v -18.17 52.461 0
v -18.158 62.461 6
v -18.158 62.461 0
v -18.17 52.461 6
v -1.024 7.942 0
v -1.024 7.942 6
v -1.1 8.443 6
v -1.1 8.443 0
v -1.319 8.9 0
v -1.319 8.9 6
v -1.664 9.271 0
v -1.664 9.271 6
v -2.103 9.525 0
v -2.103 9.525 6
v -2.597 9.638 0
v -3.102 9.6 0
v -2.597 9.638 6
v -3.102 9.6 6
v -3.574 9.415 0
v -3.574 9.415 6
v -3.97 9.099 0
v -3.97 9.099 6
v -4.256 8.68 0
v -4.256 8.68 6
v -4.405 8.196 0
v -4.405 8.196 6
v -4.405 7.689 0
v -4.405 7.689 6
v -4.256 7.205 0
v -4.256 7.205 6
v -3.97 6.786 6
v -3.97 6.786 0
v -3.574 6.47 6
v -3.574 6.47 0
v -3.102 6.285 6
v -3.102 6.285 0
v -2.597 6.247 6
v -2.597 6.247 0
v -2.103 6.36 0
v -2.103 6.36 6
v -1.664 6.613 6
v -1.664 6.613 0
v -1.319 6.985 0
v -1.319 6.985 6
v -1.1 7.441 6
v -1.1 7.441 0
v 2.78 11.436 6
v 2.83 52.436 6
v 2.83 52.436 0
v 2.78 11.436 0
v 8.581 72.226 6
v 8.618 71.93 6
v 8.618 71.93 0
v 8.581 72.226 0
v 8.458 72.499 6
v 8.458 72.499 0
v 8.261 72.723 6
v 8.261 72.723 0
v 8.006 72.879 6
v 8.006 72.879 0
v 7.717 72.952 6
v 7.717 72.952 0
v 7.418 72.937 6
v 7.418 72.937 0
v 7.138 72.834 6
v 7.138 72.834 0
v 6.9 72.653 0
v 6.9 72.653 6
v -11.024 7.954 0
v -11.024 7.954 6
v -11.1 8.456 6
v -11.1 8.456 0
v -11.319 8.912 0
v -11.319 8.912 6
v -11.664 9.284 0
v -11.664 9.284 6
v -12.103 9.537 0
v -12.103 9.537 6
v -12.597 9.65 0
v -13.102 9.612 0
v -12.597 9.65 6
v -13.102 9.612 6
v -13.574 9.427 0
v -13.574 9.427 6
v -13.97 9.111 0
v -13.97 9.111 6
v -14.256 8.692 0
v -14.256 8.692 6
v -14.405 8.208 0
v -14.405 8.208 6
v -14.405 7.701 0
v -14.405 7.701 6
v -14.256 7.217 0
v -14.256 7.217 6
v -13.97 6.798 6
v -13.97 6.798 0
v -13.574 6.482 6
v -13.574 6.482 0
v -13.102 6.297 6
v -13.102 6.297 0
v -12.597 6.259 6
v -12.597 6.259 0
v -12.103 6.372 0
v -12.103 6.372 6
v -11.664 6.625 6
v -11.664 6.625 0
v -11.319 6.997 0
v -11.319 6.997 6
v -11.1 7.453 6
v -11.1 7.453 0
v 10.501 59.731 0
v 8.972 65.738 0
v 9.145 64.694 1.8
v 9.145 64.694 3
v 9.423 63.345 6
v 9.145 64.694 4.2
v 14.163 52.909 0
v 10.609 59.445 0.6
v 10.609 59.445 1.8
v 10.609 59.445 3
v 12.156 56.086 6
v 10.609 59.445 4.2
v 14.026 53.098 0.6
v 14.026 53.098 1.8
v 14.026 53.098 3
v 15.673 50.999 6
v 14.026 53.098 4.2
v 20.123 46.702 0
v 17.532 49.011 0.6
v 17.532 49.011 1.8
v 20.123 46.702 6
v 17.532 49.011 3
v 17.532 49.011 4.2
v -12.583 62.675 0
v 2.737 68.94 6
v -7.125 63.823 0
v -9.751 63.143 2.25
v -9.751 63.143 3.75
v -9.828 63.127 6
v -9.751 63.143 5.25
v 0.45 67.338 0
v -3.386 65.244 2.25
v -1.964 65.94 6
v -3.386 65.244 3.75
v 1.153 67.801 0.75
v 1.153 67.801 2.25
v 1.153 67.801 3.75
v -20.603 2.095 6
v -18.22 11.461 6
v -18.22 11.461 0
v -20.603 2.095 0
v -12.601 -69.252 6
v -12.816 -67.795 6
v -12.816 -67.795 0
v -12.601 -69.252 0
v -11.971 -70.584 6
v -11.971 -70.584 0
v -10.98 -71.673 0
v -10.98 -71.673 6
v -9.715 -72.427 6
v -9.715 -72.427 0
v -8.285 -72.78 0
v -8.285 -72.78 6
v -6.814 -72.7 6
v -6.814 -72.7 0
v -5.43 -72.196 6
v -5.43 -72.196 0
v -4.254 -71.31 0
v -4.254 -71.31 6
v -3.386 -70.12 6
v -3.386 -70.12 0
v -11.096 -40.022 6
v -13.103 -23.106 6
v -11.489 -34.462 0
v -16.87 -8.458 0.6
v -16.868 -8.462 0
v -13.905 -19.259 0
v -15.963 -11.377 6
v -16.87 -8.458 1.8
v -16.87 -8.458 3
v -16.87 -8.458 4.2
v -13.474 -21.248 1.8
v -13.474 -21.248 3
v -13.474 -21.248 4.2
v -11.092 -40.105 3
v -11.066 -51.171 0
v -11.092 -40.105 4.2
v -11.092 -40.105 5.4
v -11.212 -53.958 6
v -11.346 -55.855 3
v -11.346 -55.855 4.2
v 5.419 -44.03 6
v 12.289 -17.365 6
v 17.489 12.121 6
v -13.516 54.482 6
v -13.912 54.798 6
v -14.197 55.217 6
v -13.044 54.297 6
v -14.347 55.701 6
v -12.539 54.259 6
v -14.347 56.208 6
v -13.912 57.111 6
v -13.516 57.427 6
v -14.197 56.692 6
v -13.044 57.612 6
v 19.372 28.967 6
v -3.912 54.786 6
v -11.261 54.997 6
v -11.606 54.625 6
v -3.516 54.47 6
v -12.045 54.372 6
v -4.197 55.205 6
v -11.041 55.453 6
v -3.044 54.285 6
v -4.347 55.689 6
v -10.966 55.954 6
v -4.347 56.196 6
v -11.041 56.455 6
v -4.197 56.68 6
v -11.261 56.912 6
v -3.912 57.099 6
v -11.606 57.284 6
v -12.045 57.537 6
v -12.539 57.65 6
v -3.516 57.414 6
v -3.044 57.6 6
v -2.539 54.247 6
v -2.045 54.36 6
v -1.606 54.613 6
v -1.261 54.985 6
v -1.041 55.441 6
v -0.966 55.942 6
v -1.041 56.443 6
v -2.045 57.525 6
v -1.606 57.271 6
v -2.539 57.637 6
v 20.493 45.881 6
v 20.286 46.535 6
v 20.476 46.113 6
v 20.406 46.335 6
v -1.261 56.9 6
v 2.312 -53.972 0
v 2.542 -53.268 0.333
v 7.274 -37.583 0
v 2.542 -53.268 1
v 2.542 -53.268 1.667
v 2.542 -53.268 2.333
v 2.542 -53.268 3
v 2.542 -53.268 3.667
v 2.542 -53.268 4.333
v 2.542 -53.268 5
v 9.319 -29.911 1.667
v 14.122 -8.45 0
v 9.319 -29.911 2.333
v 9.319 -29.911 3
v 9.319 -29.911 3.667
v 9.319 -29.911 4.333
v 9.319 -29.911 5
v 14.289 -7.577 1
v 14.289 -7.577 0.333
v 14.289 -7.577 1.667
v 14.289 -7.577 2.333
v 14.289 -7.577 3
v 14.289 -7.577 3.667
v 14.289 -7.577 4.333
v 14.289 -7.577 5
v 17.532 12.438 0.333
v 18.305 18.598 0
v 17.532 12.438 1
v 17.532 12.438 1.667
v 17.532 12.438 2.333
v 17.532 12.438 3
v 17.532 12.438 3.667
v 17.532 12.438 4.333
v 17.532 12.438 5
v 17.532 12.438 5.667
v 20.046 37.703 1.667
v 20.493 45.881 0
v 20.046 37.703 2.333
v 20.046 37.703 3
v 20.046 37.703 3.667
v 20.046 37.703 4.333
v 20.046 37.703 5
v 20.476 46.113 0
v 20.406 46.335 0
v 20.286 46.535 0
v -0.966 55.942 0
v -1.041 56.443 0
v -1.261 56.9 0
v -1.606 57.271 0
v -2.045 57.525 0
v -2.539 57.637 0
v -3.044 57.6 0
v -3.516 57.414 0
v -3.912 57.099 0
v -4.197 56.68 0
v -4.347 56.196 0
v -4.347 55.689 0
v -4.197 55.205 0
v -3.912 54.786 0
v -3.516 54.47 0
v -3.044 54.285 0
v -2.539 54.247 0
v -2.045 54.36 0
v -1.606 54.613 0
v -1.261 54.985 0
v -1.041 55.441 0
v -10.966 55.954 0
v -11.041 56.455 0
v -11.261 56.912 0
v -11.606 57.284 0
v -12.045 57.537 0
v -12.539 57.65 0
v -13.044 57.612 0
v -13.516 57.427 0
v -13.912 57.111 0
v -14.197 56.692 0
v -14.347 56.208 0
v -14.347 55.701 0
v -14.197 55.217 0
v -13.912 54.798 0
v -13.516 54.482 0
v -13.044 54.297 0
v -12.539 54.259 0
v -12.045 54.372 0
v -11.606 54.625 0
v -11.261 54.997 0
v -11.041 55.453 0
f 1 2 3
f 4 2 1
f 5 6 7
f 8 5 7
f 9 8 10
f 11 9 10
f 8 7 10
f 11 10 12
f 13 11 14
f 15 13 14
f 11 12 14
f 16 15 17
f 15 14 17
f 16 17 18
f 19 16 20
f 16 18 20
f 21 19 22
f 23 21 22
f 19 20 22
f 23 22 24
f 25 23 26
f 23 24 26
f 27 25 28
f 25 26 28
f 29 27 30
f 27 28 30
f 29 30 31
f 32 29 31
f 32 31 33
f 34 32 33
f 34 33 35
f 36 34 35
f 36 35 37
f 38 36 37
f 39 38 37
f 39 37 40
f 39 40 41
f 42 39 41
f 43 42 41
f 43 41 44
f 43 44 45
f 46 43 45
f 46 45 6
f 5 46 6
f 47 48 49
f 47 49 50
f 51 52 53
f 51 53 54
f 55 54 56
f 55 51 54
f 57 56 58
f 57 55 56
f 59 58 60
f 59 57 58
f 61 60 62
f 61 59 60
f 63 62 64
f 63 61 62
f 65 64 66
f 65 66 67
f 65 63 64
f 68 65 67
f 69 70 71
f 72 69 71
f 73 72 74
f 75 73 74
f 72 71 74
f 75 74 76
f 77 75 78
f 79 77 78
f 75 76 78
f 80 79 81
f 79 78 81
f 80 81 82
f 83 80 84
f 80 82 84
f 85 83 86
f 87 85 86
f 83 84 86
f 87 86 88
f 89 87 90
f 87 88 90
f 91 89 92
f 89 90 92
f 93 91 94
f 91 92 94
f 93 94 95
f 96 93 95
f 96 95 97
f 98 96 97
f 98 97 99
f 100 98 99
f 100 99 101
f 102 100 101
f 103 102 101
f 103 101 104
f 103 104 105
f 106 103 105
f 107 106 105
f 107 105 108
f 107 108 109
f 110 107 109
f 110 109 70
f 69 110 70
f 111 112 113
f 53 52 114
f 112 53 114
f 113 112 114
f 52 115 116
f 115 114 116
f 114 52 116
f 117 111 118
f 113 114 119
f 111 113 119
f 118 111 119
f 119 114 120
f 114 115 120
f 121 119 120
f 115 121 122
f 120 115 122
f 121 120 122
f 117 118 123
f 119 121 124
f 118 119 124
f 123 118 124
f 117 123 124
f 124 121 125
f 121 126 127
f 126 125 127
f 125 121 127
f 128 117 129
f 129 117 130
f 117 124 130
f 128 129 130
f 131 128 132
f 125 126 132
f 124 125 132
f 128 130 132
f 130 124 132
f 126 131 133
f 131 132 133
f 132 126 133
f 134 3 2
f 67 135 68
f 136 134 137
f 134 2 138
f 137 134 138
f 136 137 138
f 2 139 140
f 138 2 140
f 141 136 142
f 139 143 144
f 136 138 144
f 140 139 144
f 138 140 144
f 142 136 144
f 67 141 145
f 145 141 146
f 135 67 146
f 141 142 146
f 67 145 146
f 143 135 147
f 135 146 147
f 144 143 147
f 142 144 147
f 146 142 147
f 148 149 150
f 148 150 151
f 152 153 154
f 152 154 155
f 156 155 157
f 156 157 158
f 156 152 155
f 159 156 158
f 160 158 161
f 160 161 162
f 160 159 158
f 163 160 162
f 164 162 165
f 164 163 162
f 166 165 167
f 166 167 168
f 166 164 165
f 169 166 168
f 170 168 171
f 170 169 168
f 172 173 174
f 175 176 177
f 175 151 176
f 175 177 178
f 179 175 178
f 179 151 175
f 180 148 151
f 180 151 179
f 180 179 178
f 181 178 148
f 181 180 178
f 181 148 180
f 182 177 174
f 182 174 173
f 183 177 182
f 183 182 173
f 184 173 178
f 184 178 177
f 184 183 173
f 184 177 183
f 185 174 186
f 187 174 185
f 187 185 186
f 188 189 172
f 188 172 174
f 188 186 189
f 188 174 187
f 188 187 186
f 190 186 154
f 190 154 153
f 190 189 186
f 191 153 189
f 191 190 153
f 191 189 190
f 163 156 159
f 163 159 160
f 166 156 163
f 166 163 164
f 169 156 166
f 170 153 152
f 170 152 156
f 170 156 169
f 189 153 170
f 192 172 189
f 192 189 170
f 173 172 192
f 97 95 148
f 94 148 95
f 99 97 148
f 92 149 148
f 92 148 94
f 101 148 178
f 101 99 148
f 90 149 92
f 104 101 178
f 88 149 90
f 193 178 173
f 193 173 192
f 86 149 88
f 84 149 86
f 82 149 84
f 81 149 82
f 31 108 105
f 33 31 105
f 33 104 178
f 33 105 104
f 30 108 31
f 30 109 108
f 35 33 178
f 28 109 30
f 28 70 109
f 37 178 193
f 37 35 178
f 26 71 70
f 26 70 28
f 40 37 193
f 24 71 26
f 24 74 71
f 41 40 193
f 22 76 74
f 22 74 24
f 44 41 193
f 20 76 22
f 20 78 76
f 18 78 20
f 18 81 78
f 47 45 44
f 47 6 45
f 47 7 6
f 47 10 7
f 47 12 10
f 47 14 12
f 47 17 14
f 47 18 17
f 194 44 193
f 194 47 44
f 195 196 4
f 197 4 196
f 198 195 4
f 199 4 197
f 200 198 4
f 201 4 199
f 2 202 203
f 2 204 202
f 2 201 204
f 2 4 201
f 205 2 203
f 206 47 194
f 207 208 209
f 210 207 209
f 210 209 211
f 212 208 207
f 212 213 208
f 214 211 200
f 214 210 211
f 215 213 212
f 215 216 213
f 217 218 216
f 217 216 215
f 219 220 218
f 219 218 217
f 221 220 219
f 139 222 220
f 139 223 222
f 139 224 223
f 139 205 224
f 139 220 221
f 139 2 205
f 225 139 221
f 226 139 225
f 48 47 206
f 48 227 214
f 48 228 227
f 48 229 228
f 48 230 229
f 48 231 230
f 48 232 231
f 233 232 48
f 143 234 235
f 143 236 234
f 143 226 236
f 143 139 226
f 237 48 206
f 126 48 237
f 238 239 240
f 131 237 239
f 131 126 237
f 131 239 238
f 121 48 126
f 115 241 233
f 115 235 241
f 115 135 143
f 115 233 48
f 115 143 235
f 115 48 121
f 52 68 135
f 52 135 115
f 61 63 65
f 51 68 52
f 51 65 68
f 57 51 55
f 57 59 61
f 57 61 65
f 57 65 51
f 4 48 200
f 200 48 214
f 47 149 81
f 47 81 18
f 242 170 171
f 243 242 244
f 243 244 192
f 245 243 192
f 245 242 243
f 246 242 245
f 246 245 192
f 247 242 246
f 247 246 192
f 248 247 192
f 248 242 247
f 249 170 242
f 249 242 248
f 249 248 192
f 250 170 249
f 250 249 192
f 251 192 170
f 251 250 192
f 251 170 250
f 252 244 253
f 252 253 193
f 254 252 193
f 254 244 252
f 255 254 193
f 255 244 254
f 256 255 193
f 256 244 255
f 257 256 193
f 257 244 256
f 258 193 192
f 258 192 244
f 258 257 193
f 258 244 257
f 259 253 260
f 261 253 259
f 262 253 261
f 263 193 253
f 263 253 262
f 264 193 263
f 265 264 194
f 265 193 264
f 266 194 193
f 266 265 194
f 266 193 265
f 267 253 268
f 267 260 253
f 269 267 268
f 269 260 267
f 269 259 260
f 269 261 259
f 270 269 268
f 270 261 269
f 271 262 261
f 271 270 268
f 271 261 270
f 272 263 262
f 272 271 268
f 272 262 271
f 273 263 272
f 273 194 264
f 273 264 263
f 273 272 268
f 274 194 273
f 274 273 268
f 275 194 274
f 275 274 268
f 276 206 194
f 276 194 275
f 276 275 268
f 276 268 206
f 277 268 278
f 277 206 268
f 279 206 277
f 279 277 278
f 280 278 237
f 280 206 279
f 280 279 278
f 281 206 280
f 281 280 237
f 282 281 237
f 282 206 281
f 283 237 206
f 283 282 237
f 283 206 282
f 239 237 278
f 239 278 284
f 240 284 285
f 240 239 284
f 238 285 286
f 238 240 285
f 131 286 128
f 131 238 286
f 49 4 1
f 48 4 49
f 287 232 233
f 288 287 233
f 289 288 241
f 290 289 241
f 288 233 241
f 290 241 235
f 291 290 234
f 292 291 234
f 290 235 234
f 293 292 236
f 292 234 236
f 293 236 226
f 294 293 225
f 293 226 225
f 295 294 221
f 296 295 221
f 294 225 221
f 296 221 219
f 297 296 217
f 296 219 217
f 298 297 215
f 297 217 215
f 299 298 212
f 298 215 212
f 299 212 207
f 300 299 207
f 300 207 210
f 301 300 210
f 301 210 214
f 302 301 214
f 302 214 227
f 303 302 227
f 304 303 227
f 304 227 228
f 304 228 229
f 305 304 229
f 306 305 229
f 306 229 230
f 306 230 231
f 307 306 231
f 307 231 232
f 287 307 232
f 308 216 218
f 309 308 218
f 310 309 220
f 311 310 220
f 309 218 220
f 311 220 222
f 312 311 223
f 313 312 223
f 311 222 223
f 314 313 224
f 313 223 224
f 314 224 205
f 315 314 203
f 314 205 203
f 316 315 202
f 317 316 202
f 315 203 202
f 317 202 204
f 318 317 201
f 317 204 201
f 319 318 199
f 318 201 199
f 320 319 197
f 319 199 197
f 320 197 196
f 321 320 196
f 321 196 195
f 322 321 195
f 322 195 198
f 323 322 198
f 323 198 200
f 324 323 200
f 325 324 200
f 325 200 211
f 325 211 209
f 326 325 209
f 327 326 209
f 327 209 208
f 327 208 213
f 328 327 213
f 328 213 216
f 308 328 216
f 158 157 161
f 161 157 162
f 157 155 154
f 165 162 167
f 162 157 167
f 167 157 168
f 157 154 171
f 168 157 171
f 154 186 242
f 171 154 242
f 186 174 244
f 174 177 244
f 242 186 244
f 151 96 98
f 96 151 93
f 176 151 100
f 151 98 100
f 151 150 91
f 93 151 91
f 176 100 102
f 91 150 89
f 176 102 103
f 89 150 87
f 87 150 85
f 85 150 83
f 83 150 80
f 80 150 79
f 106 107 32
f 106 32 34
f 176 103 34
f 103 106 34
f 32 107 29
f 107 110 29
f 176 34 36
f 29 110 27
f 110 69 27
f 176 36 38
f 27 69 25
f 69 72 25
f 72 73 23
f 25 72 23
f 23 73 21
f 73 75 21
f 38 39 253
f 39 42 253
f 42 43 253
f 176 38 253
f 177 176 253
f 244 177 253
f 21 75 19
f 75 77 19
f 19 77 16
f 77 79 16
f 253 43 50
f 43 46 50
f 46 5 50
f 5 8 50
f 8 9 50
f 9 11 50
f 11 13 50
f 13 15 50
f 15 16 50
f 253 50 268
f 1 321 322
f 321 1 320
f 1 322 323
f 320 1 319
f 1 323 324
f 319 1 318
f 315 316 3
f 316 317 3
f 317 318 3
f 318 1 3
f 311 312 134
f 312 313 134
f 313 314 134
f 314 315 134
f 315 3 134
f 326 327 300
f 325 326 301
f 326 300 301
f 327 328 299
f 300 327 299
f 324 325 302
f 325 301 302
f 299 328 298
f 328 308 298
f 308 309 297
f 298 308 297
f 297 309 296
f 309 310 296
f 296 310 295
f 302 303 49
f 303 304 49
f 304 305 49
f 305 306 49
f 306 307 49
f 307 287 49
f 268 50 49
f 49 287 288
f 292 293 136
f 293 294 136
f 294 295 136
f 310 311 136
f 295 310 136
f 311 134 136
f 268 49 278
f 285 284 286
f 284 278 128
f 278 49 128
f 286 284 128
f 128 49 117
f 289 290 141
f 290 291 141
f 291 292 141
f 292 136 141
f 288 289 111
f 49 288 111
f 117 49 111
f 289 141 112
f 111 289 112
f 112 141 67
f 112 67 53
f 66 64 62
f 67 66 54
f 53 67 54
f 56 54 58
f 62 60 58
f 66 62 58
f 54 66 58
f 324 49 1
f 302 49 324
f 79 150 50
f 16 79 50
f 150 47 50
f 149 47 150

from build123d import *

# Parameters (mm, degrees)
SKETCH1_W           = 50
SKETCH1_H           = 146
BOSS_EXTRUDE1_DEPTH = 6
SKETCH3_W           = 50
SKETCH3_H           = 146
SKETCH3_R           = 1.7
CUT_EXTRUDE1_DEPTH  = 78.395090284


with BuildPart() as part:
    # Sketch1 → Boss-Extrude1 (new body)
    with BuildSketch(Plane.XY):
        Rectangle(SKETCH1_W, SKETCH1_H)
    extrude(amount=BOSS_EXTRUDE1_DEPTH)

    # Sketch3 → Cut-Extrude1 (cut, through all)
    # profile 1 of 5: a face of its own
    with BuildSketch(Plane.XY.offset(6)):
        Rectangle(SKETCH3_W, SKETCH3_H)
        with BuildLine():
            Line((-18.157666585, 62.461107324), (-18.169843297, 52.461114738))
            Line((-18.169843297, 52.461114738), (2.830141135, 52.435543643))
            Line((2.830141135, 52.435543643), (2.780216616, 11.435574039))
            Line((2.780216616, 11.435574039), (-18.219767816, 11.461145134))
            Line((-18.219767816, 11.461145134), (-20.602879389, 2.095244868))
            add(Edge.make_bspline(
                [(-20.602879389, 2.095244868), (-20.020523896, 0.117608734), (-18.597491452, -3.334331588), (-16.904181184, -8.263198364), (-15.595665152, -12.546131745), (-14.456132729, -16.810408344), (-13.502980015, -20.975707084), (-12.475078727, -26.375577077), (-11.593046993, -32.660410116), (-10.802512336, -42.889860589), (-11.008756714, -54.642065179), (-12.153104447, -63.838427604), (-12.816272335, -67.795493305)],
                knots=[0, 0, 0, 0, 0.086646204, 0.157135059, 0.219373113, 0.275194629, 0.342966262, 0.399251523, 0.506628072, 0.609997758, 0.831095498, 1, 1, 1, 1], degree=3))
            ThreePointArc((-12.816272335, -67.795493305), (-9.012812454, -72.656301077), (-3.386129771, -70.119728338))
            add(Edge.make_bspline(
                [(-3.386129771, -70.119728338), (-2.21747594, -67.029455897), (-0.182430908, -61.43213239), (2.320638839, -54.010869169), (4.39612593, -47.471958806), (6.084233389, -41.826754396), (7.773371334, -35.827923865), (9.314485553, -30.006285299), (10.847177653, -23.777350088), (12.248531309, -17.633995633), (13.38184099, -12.246243723), (14.445923409, -6.813215488), (15.450948646, -1.273466268), (16.541323936, 5.397802811), (17.525796818, 12.227452617), (18.318292736, 18.577526245), (18.968243317, 24.556005739), (19.546819221, 30.747357743), (20.091144312, 37.979656821), (20.373774924, 43.153327808), (20.493418189, 45.880508448)],
                knots=[0, 0, 0, 0, 0.083335097, 0.150214343, 0.197536109, 0.256374009, 0.298827669, 0.354728647, 0.408266597, 0.460622921, 0.513659664, 0.547132194, 0.600265327, 0.655665944, 0.717630207, 0.774302923, 0.817071636, 0.86931356, 0.9311449, 1, 1, 1, 1], degree=3))
            ThreePointArc((20.493418189, 45.880508448), (20.406083271, 46.335184873), (20.123317244, 46.701792855))
            add(Edge.make_bspline(
                [(8.617522303, 71.930046937), (8.590710324, 70.931587333), (8.616247935, 68.508726225), (8.97509159, 65.334163001), (9.675355593, 62.166917416), (10.407826162, 59.878461992), (11.375637803, 57.567082564), (12.476705695, 55.420888781), (13.985734658, 53.073760845), (15.699091005, 50.90924769), (17.727100256, 48.757794454), (19.223608489, 47.429602703), (20.123317244, 46.701792855)],
                knots=[0, 0, 0, 0, 0.10400348, 0.252210124, 0.331596335, 0.441573044, 0.501852928, 0.592428261, 0.692389888, 0.791956146, 0.879471991, 1, 1, 1, 1], degree=3))
            ThreePointArc((8.617522303, 71.930046937), (8.006083211, 72.878510262), (6.900295351, 72.653402178))
            add(Edge.make_bspline(
                [(-18.157666585, 62.461107324), (-16.595787428, 62.40054525), (-13.772759201, 62.464261258), (-9.697592278, 63.074582136), (-6.3235109, 64.014176015), (-3.330757616, 65.219156255), (-0.94481153, 66.454321846), (1.113119903, 67.745229422), (3.761030335, 69.658518488), (5.631814544, 71.346079367), (6.900295351, 72.653402178)],
                knots=[0, 0, 0, 0, 0.167942372, 0.302841242, 0.441808799, 0.543310726, 0.649111052, 0.730099181, 0.804199887, 1, 1, 1, 1], degree=3))
        make_face(mode=Mode.SUBTRACT)
    # profile 2 of 5: a face of its own
    with BuildSketch(Plane.XY.offset(6)):
        with Locations((-12.724033742, 7.954450537)):
            Circle(SKETCH3_R)
    # profile 3 of 5: a face of its own
    with BuildSketch(Plane.XY.offset(6)):
        with Locations((-2.724041156, 7.942273825)):
            Circle(SKETCH3_R)
    # profile 4 of 5: a face of its own
    with BuildSketch(Plane.XY.offset(6)):
        with Locations((-12.665585525, 55.954414952)):
            Circle(SKETCH3_R)
    # profile 5 of 5: a face of its own
    with BuildSketch(Plane.XY.offset(6)):
        with Locations((-2.665592939, 55.94223824)):
            Circle(SKETCH3_R)
    extrude(amount=-CUT_EXTRUDE1_DEPTH, mode=Mode.SUBTRACT)


solid = part.part
